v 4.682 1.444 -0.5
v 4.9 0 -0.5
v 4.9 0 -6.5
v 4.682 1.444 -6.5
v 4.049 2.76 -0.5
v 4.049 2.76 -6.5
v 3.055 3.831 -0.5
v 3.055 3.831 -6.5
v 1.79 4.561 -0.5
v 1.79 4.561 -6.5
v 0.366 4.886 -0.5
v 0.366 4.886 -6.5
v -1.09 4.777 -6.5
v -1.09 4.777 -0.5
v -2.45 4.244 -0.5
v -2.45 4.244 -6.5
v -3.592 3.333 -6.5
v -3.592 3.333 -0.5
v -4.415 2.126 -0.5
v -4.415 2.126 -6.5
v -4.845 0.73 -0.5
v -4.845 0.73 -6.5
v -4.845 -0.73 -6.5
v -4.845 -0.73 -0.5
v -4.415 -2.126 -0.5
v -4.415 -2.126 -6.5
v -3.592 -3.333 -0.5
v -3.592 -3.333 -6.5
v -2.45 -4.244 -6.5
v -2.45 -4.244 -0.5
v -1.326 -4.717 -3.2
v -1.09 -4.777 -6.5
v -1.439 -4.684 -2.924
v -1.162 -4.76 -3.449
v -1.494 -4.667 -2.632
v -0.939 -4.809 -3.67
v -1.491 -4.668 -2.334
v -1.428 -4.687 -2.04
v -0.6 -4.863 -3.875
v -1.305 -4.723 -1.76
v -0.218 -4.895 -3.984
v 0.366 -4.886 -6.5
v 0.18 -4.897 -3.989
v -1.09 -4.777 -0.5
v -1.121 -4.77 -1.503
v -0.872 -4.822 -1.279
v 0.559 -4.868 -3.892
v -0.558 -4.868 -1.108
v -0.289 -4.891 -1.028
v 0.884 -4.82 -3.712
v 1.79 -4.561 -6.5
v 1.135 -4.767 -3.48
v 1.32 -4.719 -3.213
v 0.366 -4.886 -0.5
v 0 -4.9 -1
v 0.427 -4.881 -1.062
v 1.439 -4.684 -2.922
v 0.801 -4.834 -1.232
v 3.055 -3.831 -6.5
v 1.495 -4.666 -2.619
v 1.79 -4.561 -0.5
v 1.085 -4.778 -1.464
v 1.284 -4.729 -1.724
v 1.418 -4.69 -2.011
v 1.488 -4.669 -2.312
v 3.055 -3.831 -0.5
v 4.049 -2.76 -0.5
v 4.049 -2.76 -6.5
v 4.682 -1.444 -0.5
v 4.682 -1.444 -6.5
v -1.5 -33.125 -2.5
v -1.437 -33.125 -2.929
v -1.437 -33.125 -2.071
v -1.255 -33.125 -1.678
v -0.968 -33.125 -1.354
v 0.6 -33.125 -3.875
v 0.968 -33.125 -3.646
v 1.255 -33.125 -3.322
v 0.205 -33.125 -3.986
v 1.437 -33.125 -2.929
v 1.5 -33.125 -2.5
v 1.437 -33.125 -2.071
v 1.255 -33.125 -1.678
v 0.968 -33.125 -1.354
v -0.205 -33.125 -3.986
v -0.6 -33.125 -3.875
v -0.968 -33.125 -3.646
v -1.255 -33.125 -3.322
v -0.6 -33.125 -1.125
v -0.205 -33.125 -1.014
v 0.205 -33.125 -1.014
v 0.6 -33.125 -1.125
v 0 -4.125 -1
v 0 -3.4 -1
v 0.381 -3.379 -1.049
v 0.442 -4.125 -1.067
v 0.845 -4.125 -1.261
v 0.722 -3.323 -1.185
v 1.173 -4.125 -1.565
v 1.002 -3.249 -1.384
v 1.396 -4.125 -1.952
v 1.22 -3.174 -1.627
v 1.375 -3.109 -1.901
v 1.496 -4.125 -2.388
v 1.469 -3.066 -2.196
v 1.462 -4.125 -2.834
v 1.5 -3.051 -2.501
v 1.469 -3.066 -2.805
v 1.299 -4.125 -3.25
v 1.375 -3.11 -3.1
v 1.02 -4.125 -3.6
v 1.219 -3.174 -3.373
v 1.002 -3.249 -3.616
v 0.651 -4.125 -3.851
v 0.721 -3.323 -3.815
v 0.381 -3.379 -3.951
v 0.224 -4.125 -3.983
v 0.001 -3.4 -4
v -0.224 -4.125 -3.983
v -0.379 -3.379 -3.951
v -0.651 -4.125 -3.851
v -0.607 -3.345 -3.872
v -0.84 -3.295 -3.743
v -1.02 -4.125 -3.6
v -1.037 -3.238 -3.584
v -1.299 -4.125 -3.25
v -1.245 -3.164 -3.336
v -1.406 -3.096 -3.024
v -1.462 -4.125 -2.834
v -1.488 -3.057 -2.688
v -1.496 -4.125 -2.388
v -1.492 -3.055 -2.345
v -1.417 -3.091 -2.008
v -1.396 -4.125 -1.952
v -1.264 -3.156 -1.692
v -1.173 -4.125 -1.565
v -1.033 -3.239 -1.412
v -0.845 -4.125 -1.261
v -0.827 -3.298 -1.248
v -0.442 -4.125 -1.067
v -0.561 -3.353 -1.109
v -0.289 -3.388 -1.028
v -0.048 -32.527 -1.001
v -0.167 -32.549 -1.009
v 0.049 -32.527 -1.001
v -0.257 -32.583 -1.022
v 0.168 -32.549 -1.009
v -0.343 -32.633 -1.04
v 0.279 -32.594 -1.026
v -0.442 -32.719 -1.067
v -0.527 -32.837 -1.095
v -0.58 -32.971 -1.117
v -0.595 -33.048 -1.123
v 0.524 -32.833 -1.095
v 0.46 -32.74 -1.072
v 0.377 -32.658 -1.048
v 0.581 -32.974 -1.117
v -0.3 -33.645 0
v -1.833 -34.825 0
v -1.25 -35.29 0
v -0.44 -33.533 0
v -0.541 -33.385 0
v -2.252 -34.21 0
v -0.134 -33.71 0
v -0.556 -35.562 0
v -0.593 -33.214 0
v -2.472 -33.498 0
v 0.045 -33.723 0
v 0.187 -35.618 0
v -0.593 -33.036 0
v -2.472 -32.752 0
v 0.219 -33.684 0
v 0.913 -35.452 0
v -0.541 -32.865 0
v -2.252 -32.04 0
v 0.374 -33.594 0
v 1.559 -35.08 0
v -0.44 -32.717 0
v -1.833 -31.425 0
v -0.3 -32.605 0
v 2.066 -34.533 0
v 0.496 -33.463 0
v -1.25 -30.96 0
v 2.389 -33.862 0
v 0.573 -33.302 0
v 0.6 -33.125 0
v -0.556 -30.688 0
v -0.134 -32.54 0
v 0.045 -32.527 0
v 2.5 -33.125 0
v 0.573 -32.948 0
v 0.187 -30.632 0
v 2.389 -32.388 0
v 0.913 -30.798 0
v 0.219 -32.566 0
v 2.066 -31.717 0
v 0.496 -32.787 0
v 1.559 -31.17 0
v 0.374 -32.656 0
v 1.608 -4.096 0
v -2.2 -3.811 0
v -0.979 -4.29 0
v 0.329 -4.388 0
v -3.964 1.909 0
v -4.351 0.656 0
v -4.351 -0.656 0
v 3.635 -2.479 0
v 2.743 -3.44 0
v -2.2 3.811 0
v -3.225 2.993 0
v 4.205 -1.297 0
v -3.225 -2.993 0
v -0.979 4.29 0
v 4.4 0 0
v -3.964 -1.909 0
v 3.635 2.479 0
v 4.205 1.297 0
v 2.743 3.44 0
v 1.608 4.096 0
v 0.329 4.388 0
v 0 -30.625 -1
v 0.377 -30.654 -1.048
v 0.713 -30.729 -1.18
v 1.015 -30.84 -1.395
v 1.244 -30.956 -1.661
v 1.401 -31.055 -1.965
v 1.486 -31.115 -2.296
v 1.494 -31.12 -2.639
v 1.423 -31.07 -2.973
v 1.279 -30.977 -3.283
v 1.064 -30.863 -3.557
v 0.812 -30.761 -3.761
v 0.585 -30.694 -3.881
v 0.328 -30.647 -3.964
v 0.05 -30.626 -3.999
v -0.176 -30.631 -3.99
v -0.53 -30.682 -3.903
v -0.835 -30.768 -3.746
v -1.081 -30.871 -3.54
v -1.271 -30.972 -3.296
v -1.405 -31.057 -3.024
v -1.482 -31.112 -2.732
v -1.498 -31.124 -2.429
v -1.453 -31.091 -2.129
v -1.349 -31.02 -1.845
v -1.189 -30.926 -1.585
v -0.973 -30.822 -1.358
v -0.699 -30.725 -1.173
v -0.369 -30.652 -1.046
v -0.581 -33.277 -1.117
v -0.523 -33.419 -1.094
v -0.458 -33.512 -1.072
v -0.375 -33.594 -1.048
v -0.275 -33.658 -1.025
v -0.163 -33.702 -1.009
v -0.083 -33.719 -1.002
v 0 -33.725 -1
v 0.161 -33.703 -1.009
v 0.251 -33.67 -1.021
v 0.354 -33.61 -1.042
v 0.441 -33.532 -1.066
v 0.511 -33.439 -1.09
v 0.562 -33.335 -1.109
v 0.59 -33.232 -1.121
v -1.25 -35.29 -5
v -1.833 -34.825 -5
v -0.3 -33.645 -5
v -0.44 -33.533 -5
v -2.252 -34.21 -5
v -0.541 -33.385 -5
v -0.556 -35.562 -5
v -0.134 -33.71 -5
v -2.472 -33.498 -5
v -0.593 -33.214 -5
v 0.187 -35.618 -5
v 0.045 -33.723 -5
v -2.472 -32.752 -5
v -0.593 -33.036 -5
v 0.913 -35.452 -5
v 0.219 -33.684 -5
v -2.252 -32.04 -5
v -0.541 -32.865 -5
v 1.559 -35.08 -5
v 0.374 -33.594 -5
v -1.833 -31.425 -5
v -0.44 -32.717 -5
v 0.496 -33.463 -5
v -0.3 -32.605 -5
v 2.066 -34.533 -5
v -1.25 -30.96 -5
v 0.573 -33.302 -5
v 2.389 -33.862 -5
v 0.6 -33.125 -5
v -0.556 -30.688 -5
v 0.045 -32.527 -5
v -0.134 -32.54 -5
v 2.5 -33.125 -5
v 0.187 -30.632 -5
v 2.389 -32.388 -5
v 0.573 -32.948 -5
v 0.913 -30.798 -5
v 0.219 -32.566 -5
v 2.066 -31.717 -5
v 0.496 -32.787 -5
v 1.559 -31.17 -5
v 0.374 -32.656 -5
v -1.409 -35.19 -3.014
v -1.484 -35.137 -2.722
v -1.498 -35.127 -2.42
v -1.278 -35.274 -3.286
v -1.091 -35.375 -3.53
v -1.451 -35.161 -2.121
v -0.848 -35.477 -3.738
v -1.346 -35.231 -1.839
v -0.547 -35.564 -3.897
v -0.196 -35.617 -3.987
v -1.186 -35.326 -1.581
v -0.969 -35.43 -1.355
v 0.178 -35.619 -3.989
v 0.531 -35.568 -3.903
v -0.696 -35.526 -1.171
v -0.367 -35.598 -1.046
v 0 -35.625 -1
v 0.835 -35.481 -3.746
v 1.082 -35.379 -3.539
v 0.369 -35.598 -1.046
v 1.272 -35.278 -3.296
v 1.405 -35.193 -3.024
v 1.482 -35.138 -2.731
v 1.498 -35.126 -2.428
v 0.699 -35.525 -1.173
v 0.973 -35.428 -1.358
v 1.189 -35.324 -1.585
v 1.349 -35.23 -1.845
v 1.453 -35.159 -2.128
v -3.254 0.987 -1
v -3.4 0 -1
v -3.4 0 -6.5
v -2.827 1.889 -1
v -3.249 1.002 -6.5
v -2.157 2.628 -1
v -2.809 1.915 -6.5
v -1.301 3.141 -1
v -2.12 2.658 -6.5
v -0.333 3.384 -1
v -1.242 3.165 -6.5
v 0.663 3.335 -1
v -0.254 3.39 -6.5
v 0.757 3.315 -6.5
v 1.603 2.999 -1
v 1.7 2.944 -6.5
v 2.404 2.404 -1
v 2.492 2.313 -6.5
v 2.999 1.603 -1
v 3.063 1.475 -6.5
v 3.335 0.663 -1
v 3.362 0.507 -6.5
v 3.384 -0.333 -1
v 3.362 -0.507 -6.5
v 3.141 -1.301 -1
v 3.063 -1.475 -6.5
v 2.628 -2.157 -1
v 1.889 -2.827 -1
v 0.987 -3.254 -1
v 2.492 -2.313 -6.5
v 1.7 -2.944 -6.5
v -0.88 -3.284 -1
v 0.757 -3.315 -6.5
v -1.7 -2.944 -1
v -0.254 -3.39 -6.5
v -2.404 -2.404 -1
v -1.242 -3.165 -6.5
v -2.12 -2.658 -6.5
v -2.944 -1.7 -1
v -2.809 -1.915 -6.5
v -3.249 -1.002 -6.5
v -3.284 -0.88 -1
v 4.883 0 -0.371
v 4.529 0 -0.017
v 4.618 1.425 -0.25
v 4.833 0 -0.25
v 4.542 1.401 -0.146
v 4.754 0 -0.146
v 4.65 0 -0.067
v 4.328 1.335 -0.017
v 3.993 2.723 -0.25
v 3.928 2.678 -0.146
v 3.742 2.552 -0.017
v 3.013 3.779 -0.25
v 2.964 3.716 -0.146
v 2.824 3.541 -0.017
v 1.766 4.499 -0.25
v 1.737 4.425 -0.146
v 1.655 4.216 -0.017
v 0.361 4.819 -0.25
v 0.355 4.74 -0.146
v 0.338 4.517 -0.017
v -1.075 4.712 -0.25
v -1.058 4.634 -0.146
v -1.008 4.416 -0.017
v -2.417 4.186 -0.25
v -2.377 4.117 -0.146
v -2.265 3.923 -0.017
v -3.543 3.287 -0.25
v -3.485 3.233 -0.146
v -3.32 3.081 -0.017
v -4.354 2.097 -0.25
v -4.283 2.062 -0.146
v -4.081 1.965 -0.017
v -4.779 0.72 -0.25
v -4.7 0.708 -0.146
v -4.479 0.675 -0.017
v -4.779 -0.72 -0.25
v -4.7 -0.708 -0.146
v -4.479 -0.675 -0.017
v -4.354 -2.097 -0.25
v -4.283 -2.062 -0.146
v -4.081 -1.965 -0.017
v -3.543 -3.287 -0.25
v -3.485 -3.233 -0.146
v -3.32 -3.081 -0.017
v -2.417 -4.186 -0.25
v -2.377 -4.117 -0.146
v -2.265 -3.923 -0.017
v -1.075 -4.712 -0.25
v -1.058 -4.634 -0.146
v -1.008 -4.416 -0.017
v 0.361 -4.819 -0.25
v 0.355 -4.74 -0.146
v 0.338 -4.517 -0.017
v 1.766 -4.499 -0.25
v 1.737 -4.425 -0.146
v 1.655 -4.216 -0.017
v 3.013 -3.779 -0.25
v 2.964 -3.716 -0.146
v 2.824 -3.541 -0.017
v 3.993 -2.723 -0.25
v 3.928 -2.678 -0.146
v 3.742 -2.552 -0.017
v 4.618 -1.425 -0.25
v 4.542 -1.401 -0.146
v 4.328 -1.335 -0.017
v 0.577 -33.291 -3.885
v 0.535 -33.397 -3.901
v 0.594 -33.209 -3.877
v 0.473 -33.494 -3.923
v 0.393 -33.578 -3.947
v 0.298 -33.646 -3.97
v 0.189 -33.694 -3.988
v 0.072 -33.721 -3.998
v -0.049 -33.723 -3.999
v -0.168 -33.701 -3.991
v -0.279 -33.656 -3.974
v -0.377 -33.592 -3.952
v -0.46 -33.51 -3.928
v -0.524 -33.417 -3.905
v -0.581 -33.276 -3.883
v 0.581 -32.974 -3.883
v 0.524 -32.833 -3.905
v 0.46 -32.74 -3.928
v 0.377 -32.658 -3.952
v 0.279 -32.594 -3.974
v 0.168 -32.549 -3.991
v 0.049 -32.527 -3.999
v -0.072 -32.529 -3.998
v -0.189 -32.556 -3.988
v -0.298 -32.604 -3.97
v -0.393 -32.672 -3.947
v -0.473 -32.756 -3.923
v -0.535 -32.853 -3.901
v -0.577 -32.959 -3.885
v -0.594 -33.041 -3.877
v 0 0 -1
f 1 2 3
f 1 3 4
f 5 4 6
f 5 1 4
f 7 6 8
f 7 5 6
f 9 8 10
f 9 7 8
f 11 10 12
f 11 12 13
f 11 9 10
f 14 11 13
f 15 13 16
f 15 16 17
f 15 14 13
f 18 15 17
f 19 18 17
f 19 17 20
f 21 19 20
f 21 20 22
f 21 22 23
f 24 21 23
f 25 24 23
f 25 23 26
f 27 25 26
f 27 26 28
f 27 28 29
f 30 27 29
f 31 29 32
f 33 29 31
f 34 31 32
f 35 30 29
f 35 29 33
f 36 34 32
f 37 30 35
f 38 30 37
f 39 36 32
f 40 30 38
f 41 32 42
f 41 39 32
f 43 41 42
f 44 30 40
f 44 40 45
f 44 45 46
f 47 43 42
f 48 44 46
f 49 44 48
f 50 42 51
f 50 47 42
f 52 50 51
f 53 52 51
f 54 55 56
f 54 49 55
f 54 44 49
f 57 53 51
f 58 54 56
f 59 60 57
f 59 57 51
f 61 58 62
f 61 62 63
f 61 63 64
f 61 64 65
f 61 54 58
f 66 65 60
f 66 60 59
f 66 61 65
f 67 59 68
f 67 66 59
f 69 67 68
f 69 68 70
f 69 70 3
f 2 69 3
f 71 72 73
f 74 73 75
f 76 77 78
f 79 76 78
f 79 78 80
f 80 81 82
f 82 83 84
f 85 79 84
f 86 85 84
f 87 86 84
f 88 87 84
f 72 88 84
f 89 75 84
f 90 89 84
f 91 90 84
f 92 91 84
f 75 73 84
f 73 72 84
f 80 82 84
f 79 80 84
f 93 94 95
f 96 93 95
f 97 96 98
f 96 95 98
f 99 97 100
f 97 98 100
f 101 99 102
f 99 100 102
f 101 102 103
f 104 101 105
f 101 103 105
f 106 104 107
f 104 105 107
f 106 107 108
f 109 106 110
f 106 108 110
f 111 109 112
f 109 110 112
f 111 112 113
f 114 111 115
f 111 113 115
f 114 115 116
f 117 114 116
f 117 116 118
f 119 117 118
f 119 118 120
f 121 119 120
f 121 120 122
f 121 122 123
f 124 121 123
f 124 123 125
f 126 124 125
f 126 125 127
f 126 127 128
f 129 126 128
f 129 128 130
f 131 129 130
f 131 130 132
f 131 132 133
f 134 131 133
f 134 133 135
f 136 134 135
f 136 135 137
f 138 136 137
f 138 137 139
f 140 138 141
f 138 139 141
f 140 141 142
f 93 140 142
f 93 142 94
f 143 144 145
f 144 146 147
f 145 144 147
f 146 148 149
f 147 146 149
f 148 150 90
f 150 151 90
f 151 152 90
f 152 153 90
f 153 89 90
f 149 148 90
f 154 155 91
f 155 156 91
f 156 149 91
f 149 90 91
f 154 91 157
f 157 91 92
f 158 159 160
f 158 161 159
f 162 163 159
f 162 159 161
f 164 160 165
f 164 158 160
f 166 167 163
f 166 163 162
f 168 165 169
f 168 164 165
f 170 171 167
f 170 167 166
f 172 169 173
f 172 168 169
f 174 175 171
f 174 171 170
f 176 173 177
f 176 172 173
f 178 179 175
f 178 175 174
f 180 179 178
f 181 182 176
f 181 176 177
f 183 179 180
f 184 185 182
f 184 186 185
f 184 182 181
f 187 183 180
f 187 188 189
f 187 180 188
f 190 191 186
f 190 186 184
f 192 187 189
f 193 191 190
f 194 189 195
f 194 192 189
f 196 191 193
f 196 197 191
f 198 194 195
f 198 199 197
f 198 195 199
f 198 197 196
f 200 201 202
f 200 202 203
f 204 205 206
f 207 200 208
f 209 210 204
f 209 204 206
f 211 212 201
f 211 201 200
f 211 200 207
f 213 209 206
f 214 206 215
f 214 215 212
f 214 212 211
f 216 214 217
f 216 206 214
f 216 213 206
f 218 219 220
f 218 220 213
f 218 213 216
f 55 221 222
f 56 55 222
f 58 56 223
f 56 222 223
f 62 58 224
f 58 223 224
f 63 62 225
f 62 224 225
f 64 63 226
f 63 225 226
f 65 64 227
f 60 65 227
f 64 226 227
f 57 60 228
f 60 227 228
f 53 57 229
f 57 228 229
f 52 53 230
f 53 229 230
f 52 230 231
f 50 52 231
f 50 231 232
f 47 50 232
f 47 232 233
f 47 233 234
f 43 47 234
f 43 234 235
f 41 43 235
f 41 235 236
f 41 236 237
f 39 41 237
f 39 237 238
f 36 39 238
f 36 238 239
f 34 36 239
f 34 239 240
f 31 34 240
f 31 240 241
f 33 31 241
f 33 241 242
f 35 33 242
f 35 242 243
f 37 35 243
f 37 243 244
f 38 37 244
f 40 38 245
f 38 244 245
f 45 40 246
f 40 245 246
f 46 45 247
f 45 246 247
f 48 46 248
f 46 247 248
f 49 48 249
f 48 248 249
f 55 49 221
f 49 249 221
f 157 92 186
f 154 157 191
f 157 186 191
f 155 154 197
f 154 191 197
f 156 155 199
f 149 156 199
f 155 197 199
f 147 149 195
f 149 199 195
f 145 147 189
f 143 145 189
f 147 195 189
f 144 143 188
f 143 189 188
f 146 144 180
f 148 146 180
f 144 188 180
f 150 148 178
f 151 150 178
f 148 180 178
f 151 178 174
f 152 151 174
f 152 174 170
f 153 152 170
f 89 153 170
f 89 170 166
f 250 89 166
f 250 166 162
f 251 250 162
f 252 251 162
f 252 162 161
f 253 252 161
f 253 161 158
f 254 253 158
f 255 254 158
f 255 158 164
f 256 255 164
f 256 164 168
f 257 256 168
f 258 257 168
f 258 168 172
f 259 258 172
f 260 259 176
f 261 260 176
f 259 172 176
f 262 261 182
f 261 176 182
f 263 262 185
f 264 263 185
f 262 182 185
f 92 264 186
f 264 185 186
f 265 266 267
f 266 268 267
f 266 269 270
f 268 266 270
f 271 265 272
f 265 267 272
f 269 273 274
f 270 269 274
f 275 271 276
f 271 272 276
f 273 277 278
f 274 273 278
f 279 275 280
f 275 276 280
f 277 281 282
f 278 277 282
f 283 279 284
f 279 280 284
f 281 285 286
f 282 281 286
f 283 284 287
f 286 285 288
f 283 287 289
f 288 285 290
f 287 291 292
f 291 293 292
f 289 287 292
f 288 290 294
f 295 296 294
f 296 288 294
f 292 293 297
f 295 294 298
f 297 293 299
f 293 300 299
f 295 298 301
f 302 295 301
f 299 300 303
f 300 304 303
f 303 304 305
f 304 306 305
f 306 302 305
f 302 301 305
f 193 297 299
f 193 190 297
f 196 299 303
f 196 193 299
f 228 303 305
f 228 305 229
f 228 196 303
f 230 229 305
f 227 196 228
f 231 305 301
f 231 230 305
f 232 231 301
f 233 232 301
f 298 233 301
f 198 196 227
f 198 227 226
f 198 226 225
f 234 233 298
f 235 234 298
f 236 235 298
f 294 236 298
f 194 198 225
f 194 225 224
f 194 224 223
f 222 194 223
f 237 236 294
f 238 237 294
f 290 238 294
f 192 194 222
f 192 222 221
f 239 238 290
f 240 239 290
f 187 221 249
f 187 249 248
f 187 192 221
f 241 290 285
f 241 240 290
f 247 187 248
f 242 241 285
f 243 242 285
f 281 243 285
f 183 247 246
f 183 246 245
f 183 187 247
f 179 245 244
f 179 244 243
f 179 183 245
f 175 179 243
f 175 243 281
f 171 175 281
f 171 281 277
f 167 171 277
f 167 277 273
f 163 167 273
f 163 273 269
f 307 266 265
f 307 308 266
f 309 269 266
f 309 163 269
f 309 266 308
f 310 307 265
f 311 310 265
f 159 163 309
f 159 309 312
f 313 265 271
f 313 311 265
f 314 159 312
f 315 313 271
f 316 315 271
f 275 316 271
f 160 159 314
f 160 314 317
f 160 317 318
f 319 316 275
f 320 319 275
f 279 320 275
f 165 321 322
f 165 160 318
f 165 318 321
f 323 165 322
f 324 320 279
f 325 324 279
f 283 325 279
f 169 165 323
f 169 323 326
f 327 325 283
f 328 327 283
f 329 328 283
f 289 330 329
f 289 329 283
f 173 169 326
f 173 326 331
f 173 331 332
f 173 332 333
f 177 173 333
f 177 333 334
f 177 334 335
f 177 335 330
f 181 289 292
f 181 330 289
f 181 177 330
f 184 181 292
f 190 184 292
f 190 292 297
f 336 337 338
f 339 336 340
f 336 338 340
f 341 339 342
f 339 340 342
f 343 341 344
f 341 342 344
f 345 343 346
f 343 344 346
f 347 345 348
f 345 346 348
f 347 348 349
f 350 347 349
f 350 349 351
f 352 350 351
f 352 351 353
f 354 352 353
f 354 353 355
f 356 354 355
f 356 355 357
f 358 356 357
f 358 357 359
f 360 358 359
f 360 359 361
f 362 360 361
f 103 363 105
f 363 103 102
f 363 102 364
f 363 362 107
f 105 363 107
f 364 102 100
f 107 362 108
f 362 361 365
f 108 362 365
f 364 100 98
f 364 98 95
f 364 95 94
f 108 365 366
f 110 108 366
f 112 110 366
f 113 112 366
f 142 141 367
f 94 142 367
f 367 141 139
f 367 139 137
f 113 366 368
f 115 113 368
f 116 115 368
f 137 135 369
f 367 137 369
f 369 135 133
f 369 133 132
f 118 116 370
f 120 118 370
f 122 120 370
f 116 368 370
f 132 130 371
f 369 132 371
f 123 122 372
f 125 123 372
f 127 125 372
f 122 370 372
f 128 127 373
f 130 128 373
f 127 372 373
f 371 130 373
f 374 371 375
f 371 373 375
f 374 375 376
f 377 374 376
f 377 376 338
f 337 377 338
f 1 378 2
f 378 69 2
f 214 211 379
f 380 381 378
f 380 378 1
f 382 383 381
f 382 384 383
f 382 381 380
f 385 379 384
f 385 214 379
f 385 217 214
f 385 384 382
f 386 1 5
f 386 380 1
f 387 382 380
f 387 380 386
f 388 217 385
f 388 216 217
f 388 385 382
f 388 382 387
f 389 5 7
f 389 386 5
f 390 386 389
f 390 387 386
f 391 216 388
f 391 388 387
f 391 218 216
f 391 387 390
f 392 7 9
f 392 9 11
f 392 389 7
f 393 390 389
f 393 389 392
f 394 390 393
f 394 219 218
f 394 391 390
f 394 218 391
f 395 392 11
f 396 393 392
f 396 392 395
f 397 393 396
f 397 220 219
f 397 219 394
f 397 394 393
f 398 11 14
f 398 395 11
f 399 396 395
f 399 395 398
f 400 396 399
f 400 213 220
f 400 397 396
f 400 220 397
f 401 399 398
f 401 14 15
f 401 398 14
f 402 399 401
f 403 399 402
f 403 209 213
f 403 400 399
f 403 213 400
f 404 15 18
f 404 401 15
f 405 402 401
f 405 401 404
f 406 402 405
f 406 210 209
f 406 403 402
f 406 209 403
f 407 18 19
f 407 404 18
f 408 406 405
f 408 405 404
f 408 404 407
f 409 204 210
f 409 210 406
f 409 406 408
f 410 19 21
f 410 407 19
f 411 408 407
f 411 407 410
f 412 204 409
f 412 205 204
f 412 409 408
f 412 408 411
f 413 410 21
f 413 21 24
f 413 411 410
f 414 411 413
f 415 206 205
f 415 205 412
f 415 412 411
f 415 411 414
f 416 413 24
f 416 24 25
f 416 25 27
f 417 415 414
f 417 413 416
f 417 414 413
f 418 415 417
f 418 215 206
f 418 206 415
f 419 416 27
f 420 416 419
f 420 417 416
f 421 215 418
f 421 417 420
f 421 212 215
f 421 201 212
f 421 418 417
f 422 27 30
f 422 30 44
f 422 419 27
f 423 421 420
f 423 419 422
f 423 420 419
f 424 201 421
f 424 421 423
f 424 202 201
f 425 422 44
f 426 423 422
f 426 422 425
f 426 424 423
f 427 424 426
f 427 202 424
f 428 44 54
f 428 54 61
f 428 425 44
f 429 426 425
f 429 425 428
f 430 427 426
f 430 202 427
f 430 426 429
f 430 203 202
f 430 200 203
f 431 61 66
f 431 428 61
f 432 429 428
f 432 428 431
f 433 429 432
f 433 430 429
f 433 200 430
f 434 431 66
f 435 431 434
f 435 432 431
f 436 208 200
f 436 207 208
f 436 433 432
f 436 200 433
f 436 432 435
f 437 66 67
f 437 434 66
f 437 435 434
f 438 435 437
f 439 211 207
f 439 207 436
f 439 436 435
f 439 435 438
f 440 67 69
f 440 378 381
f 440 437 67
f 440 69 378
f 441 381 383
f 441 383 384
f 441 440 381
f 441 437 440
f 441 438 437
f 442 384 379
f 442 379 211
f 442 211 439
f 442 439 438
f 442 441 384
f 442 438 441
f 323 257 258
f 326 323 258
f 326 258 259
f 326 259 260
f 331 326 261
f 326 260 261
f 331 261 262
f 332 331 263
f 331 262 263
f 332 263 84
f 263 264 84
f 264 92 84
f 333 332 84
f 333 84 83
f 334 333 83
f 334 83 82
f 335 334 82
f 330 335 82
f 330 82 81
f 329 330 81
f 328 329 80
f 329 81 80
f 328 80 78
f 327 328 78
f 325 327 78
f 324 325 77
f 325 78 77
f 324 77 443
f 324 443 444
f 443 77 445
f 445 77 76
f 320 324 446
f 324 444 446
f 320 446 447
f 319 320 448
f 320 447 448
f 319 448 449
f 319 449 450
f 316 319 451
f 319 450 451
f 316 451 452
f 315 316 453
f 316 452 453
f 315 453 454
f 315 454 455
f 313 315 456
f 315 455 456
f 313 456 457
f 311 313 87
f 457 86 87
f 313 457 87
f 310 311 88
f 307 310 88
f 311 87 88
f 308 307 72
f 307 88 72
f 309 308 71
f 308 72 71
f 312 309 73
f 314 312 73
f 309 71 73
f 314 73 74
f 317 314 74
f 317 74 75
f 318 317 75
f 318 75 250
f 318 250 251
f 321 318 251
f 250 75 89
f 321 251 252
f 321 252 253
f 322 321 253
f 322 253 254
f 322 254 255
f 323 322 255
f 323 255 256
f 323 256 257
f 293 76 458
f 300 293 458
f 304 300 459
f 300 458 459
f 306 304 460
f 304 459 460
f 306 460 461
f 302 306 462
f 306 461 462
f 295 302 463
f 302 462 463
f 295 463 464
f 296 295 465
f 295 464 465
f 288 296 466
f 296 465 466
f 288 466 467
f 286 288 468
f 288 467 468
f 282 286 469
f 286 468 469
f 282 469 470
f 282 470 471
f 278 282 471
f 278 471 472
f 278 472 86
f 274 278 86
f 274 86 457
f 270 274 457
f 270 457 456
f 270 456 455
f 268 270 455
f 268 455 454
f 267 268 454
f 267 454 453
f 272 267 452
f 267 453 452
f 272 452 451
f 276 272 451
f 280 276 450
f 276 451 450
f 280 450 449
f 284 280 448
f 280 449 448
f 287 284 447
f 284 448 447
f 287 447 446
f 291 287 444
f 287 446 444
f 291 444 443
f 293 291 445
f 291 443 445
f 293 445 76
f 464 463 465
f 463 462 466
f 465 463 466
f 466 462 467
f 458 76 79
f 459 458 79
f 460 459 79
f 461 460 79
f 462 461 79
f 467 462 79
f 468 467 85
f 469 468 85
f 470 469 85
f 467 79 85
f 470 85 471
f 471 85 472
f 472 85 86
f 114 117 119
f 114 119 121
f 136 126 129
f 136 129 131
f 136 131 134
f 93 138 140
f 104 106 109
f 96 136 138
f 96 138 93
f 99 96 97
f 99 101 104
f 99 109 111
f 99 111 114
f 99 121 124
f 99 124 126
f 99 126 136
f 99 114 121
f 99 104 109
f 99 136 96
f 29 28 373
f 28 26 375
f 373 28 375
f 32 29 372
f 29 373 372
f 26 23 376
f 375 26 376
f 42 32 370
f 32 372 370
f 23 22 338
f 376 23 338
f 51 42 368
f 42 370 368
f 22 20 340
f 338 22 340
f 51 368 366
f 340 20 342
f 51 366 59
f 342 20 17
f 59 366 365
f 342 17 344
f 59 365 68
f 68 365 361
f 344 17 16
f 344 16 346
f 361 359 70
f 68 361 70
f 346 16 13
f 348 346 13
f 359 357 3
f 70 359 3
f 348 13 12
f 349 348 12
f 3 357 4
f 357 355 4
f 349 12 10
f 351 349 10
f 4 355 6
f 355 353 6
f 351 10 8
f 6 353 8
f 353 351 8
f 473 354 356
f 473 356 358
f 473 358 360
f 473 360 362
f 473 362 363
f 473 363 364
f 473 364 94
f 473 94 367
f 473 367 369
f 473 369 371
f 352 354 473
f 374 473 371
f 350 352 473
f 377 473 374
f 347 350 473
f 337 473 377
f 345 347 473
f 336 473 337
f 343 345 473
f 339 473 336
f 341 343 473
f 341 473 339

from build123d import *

# Parameters (mm, degrees)
SKETCH_1_R               = 4.9
EXTRUDE_1_DEPTH          = 6.5
SKETCH_7_R               = 3.4
CUT_EXTRUDE_1_DEPTH      = 5.5
SKETCH_8_R               = 1.5
CUT_EXTRUDE_6_DEPTH      = 5.9
FILLET_3_R               = 0.5
SKETCH_15_R              = 2.5
EXTRUDE_6_DEPTH          = 2.5
EXTRUDE_6_DEPTH_BACK     = 2.5
SKETCH_16_R              = 1.5
CUT_EXTRUDE_7_DEPTH      = 2.5
CUT_EXTRUDE_7_DEPTH_BACK = 2.5
SKETCH_17_R              = 0.6
CUT_EXTRUDE_8_DEPTH      = 7.5000001
SKETCH_18_R              = 1.5
EXTRUDE_7_DEPTH          = 29


with BuildPart() as part:
    # Sketch 1 → Extrude 1 (new body)
    with BuildSketch(Plane.XY):
        Circle(SKETCH_1_R)
    extrude(amount=-EXTRUDE_1_DEPTH)

    # Sketch 7 → Cut-Extrude 1 (cut)
    with BuildSketch(Plane(origin=(0, 0, -6.5), x_dir=(-1, 0, 0), z_dir=(0, 0, -1))):
        Circle(SKETCH_7_R)
    extrude(amount=-CUT_EXTRUDE_1_DEPTH, mode=Mode.SUBTRACT)

    # Sketch 8 → Cut-Extrude 6 (cut, through all)
    with BuildSketch(Plane(origin=(0, 0, 0), x_dir=(1, 0, 0), z_dir=(0, 1, 0))):
        with Locations(Location((0, 2.5, 0), (0, 0, 270))):  # turned: the seam where the file's is
            Circle(SKETCH_8_R)
    extrude(amount=-CUT_EXTRUDE_6_DEPTH, mode=Mode.SUBTRACT)

    # Fillet 3
    fillet_3_edges = [part.edges().sort_by_distance(p)[0] for p in [
        (-4.9, 0, 0),
    ]]
    fillet(fillet_3_edges, radius=FILLET_3_R)



with BuildPart() as body_2:
    # Sketch 15 → Extrude 6 (new body, two sides)
    with BuildSketch(Plane.XY.offset(-2.5)) as extrude_6_sk:
        with Locations((0, -33.125)):
            Circle(SKETCH_15_R)
    extrude(amount=EXTRUDE_6_DEPTH)
    extrude(extrude_6_sk.sketch, amount=-EXTRUDE_6_DEPTH_BACK)

    # Sketch 16 → Cut-Extrude 7 (cut, two sides)
    with BuildSketch(Plane(origin=(0, -33.125, 0), x_dir=(1, 0, 0), z_dir=(0, 1, 0))) as cut_extrude_7_sk:
        with Locations(Location((0, 2.5, 0), (0, 0, 270))):  # turned: the seam where the file's is
            Circle(SKETCH_16_R)
    extrude(amount=CUT_EXTRUDE_7_DEPTH, mode=Mode.SUBTRACT)
    extrude(cut_extrude_7_sk.sketch, amount=-CUT_EXTRUDE_7_DEPTH_BACK, mode=Mode.SUBTRACT)

    # Sketch 17 → Cut-Extrude 8 (cut, through all)
    with BuildSketch(Plane.XY):
        with Locations((0, -33.125)):
            Circle(SKETCH_17_R)
    extrude(amount=-CUT_EXTRUDE_8_DEPTH, mode=Mode.SUBTRACT)


with BuildPart() as part_1:
    add(part.part)

    add(body_2.part)  # Extrude 7 merges body 2
    # Sketch 18 → Extrude 7 (add)
    with BuildSketch(Plane(origin=(0, -33.125, 0), x_dir=(1, 0, 0), z_dir=(0, 1, 0))):
        with Locations(Location((0, 2.5, 0), (0, 0, 270))):  # turned: the seam where the file's is
            Circle(SKETCH_18_R)
    extrude(amount=EXTRUDE_7_DEPTH)


solid = part_1.part
